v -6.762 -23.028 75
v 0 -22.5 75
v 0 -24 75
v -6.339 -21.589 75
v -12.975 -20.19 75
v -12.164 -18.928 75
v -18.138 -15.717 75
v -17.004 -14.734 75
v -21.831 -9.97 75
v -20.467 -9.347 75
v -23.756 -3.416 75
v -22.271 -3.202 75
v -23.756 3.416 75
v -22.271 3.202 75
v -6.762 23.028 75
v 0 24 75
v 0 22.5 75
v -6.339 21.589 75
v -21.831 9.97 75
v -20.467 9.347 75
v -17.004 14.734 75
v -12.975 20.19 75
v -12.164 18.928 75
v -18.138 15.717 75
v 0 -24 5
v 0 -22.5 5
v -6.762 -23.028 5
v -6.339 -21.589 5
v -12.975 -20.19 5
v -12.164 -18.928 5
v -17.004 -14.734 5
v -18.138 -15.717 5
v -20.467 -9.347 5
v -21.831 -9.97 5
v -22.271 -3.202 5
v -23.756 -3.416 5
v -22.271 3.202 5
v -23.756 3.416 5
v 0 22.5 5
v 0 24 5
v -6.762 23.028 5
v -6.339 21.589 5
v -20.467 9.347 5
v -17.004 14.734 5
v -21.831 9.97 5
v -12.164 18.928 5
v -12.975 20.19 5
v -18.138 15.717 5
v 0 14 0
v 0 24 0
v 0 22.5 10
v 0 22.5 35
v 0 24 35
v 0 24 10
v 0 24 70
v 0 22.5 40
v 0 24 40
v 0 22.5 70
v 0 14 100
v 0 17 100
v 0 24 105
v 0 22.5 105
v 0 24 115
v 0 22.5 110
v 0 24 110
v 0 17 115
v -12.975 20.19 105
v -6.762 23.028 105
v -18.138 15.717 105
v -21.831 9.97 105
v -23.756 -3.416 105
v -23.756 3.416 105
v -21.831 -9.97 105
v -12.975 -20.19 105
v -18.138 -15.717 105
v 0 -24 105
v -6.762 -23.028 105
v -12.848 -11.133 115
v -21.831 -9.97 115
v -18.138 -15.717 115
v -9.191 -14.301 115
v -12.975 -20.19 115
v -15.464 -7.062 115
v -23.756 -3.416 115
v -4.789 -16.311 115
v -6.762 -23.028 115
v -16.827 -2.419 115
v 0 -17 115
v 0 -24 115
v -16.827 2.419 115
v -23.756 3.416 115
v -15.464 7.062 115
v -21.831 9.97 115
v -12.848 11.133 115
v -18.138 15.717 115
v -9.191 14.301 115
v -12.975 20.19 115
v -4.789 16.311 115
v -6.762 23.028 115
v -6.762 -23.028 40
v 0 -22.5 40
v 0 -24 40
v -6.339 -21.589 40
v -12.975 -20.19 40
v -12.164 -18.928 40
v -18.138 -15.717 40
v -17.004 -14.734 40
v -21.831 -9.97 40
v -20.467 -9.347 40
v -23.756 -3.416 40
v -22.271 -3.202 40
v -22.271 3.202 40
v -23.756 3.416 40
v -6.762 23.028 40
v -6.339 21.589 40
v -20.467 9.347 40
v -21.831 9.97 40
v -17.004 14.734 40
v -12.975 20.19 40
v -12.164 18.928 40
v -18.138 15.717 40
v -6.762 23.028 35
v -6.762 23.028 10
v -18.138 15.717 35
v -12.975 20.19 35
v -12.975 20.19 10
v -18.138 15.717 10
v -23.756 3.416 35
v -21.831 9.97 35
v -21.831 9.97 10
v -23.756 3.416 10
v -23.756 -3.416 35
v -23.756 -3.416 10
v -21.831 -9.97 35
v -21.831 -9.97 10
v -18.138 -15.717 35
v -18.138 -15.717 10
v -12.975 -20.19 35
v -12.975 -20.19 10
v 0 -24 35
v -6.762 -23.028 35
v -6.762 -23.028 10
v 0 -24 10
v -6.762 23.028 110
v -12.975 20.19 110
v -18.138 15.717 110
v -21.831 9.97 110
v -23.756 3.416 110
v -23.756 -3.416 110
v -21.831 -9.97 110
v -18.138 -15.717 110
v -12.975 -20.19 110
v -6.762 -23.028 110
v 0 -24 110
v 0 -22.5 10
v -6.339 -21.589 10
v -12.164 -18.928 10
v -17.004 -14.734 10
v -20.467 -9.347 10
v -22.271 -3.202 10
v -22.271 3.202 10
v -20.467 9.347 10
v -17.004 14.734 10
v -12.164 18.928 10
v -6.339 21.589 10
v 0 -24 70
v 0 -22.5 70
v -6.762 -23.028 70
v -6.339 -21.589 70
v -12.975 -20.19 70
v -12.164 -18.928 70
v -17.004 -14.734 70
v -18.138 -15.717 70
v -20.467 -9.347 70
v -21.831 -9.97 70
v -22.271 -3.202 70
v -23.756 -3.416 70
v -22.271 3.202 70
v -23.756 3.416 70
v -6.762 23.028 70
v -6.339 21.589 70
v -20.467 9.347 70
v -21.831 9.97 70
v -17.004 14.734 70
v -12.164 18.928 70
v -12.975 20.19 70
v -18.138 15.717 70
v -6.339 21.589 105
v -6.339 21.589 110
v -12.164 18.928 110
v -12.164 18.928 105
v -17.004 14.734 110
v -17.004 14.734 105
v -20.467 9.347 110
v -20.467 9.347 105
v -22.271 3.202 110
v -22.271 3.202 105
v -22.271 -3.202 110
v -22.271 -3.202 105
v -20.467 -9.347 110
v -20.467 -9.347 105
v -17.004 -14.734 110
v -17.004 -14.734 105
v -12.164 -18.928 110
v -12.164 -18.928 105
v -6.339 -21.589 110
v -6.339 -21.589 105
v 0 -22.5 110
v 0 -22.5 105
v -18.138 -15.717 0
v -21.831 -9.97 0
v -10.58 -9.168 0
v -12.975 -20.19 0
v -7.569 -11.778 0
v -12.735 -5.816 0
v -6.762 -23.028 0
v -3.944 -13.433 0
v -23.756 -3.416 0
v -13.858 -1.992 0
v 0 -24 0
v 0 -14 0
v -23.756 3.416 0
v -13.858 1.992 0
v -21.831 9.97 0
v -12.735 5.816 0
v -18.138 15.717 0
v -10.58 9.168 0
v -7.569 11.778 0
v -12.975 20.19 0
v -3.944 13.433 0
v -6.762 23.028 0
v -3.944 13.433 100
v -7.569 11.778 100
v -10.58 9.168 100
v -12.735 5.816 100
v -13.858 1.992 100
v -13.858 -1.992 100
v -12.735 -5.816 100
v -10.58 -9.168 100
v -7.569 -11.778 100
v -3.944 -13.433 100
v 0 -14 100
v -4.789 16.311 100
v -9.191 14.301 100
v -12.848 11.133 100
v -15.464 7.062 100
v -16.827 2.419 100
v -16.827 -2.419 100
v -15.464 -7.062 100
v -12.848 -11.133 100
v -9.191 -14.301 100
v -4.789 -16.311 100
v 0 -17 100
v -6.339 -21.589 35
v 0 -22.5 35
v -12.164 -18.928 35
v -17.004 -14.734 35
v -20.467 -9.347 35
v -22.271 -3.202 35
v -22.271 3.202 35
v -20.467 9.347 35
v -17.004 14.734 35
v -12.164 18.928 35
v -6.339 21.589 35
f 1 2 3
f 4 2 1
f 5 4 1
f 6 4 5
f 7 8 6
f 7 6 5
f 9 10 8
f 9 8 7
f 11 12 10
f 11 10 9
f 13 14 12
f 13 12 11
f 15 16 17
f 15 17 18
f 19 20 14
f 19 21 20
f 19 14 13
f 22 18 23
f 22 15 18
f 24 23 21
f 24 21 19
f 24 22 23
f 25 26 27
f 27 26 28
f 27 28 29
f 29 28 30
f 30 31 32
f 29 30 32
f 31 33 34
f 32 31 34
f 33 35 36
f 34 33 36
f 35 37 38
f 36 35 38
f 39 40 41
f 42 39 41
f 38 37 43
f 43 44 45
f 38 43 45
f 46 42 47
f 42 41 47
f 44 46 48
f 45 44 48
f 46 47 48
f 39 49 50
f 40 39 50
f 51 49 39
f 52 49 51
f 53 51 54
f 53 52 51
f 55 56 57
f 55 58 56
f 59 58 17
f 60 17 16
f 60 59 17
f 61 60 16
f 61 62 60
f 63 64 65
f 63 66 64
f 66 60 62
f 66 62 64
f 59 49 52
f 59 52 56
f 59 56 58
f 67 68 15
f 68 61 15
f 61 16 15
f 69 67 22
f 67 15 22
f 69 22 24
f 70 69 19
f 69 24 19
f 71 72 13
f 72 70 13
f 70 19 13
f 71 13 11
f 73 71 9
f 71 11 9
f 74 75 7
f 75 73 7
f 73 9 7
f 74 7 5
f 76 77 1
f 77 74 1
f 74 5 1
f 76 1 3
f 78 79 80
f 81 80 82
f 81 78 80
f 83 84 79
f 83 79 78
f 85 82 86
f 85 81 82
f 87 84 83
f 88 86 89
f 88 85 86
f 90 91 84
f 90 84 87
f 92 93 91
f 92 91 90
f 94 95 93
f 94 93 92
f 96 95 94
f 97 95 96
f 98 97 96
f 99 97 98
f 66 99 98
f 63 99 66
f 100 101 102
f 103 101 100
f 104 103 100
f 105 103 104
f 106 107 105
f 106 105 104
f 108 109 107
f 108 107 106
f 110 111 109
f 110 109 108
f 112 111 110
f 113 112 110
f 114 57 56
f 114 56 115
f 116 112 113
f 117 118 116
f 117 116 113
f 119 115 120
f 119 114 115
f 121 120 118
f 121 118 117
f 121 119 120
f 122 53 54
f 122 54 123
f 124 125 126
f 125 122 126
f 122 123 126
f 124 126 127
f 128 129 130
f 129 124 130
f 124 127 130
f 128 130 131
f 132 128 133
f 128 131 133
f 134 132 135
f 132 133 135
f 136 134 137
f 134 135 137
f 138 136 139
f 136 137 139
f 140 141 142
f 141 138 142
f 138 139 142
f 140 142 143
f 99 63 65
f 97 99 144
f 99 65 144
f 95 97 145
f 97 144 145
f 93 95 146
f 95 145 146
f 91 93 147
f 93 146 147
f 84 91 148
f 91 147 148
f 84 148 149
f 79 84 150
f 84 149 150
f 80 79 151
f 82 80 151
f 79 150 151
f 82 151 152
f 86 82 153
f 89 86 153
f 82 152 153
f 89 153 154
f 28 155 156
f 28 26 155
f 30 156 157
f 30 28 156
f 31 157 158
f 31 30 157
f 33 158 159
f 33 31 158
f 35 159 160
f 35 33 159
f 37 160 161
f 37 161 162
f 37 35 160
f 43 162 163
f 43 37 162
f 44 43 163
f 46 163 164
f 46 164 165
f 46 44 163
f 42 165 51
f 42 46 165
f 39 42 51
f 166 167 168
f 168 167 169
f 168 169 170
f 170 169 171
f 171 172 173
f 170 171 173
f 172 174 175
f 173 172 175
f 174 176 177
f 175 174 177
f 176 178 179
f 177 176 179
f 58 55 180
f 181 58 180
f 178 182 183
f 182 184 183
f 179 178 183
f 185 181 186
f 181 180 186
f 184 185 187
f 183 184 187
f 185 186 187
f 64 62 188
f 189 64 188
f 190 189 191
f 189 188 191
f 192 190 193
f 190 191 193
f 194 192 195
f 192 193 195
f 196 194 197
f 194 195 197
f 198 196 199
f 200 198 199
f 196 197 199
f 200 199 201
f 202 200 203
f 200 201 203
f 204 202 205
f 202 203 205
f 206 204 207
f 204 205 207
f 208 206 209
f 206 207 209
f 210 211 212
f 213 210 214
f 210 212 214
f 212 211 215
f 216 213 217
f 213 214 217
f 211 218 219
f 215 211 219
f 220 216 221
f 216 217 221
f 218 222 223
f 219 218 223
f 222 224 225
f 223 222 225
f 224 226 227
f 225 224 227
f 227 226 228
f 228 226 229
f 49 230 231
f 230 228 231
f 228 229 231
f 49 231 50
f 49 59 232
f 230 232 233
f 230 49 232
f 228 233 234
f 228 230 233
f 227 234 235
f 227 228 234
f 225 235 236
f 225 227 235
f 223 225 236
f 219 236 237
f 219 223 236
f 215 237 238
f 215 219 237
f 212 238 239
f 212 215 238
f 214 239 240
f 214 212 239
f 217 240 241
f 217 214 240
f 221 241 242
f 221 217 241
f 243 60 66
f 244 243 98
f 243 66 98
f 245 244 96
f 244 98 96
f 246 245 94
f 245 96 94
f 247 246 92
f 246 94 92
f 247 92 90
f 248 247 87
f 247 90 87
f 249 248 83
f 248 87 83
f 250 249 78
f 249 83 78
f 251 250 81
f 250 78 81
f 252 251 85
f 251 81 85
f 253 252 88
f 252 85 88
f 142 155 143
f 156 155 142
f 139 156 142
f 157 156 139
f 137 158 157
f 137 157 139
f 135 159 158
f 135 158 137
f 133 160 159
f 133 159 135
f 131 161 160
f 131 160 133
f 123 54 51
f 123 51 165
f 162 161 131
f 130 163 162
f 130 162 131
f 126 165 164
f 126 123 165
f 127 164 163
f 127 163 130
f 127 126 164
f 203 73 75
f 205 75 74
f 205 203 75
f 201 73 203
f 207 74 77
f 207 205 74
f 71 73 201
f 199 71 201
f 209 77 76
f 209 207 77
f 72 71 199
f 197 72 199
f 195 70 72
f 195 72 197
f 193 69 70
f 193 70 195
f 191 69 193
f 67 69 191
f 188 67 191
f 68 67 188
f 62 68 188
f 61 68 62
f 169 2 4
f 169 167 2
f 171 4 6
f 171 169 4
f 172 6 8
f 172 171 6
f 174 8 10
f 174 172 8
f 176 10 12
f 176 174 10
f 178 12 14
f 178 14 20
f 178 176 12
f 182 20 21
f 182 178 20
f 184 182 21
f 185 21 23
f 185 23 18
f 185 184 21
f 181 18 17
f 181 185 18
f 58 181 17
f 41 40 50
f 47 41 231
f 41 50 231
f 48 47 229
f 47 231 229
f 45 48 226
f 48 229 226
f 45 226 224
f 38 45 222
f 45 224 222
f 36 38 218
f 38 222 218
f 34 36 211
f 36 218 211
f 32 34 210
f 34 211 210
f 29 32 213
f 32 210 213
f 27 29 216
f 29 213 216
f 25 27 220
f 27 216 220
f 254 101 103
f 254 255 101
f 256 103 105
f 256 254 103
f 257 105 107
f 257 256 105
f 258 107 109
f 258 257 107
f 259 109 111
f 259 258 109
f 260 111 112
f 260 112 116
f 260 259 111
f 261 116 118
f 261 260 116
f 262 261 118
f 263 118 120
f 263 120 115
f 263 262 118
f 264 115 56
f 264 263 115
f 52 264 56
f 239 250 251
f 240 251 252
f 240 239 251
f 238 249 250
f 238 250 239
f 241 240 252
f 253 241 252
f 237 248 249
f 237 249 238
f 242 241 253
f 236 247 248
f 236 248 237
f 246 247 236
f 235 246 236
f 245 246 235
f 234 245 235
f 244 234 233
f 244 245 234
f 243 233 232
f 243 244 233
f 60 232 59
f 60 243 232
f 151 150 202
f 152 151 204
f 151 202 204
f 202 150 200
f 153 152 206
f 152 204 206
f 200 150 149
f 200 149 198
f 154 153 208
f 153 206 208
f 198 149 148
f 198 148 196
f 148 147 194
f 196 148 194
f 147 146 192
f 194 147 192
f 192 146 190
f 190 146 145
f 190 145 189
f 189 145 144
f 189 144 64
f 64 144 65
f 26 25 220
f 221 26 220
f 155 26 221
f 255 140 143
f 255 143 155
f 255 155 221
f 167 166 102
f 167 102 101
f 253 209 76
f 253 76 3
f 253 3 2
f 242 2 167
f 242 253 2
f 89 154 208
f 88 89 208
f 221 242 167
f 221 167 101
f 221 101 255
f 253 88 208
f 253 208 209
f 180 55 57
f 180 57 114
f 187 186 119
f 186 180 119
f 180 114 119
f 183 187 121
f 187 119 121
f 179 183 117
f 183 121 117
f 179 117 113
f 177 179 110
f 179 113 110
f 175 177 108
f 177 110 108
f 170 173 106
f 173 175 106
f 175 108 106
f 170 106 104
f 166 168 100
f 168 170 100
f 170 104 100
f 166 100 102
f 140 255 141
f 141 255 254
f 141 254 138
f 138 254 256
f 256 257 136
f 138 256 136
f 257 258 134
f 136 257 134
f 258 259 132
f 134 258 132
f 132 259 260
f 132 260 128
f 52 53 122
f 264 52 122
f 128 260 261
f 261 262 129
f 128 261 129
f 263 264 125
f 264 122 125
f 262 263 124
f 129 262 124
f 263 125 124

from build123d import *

# Parameters (mm, degrees)
SKETCH1_R           = 24
SKETCH1_R_2         = 14
BOSS_EXTRUDE1_DEPTH = 115
SKETCH2_W           = 30.560484556
SKETCH2_H           = 55.665733052
CUT_EXTRUDE1_DEPTH  = 130
SKETCH3_R           = 17
CUT_EXTRUDE2_DEPTH  = 15
SKETCH4_R           = 29.348690421
SKETCH4_R_2         = 22.5
CUT_EXTRUDE3_DEPTH  = 5
SKETCH5_R           = 32.227537674
SKETCH5_R_2         = 22.5
CUT_EXTRUDE4_DEPTH  = 5
SKETCH6_R           = 32.40953394
SKETCH6_R_2         = 22.5
CUT_EXTRUDE5_DEPTH  = 5
CUT_EXTRUDE6_START  = 5
SKETCH7_R           = 39.356381894
SKETCH7_R_2         = 22.5
CUT_EXTRUDE6_DEPTH  = 5


with BuildPart() as part:
    # Sketch1 → Boss-Extrude1 (new body)
    with BuildSketch(Plane.XY):
        Circle(SKETCH1_R)
        Circle(SKETCH1_R_2, mode=Mode.SUBTRACT)
    extrude(amount=BOSS_EXTRUDE1_DEPTH)

    # Sketch2 → Cut-Extrude1 (cut)
    with BuildSketch(Plane.XY.offset(115)):
        with Locations((15.280242278, -0.503267732)):
            Rectangle(SKETCH2_W, SKETCH2_H)
    extrude(amount=-CUT_EXTRUDE1_DEPTH, mode=Mode.SUBTRACT)

    # Sketch3 → Cut-Extrude2 (cut)
    with BuildSketch(Plane.XY.offset(115)):
        Circle(SKETCH3_R)
    extrude(amount=-CUT_EXTRUDE2_DEPTH, mode=Mode.SUBTRACT)

    # Sketch4 → Cut-Extrude3 (cut)
    with BuildSketch(Plane(origin=(0, 0, 35), x_dir=(-1, 0, 0), z_dir=(0, 0, -1))):
        Circle(SKETCH4_R)
        Circle(SKETCH4_R_2, mode=Mode.SUBTRACT)
    extrude(amount=-CUT_EXTRUDE3_DEPTH, mode=Mode.SUBTRACT)

    # Sketch5 → Cut-Extrude4 (cut)
    with BuildSketch(Plane(origin=(0, 0, 70), x_dir=(-1, 0, 0), z_dir=(0, 0, -1))):
        Circle(SKETCH5_R)
        Circle(SKETCH5_R_2, mode=Mode.SUBTRACT)
    extrude(amount=-CUT_EXTRUDE4_DEPTH, mode=Mode.SUBTRACT)

    # Sketch6 → Cut-Extrude5 (cut)
    with BuildSketch(Plane.XY.offset(105)):
        Circle(SKETCH6_R)
        Circle(SKETCH6_R_2, mode=Mode.SUBTRACT)
    extrude(amount=CUT_EXTRUDE5_DEPTH, mode=Mode.SUBTRACT)

    # Sketch7 → Cut-Extrude6 (cut)
    with BuildSketch(Plane(origin=(0, 0, 10), x_dir=(-1, 0, 0), z_dir=(0, 0, -1)).offset(CUT_EXTRUDE6_START)):
        Circle(SKETCH7_R)
        Circle(SKETCH7_R_2, mode=Mode.SUBTRACT)
    extrude(amount=-CUT_EXTRUDE6_DEPTH, mode=Mode.SUBTRACT)


solid = part.part
